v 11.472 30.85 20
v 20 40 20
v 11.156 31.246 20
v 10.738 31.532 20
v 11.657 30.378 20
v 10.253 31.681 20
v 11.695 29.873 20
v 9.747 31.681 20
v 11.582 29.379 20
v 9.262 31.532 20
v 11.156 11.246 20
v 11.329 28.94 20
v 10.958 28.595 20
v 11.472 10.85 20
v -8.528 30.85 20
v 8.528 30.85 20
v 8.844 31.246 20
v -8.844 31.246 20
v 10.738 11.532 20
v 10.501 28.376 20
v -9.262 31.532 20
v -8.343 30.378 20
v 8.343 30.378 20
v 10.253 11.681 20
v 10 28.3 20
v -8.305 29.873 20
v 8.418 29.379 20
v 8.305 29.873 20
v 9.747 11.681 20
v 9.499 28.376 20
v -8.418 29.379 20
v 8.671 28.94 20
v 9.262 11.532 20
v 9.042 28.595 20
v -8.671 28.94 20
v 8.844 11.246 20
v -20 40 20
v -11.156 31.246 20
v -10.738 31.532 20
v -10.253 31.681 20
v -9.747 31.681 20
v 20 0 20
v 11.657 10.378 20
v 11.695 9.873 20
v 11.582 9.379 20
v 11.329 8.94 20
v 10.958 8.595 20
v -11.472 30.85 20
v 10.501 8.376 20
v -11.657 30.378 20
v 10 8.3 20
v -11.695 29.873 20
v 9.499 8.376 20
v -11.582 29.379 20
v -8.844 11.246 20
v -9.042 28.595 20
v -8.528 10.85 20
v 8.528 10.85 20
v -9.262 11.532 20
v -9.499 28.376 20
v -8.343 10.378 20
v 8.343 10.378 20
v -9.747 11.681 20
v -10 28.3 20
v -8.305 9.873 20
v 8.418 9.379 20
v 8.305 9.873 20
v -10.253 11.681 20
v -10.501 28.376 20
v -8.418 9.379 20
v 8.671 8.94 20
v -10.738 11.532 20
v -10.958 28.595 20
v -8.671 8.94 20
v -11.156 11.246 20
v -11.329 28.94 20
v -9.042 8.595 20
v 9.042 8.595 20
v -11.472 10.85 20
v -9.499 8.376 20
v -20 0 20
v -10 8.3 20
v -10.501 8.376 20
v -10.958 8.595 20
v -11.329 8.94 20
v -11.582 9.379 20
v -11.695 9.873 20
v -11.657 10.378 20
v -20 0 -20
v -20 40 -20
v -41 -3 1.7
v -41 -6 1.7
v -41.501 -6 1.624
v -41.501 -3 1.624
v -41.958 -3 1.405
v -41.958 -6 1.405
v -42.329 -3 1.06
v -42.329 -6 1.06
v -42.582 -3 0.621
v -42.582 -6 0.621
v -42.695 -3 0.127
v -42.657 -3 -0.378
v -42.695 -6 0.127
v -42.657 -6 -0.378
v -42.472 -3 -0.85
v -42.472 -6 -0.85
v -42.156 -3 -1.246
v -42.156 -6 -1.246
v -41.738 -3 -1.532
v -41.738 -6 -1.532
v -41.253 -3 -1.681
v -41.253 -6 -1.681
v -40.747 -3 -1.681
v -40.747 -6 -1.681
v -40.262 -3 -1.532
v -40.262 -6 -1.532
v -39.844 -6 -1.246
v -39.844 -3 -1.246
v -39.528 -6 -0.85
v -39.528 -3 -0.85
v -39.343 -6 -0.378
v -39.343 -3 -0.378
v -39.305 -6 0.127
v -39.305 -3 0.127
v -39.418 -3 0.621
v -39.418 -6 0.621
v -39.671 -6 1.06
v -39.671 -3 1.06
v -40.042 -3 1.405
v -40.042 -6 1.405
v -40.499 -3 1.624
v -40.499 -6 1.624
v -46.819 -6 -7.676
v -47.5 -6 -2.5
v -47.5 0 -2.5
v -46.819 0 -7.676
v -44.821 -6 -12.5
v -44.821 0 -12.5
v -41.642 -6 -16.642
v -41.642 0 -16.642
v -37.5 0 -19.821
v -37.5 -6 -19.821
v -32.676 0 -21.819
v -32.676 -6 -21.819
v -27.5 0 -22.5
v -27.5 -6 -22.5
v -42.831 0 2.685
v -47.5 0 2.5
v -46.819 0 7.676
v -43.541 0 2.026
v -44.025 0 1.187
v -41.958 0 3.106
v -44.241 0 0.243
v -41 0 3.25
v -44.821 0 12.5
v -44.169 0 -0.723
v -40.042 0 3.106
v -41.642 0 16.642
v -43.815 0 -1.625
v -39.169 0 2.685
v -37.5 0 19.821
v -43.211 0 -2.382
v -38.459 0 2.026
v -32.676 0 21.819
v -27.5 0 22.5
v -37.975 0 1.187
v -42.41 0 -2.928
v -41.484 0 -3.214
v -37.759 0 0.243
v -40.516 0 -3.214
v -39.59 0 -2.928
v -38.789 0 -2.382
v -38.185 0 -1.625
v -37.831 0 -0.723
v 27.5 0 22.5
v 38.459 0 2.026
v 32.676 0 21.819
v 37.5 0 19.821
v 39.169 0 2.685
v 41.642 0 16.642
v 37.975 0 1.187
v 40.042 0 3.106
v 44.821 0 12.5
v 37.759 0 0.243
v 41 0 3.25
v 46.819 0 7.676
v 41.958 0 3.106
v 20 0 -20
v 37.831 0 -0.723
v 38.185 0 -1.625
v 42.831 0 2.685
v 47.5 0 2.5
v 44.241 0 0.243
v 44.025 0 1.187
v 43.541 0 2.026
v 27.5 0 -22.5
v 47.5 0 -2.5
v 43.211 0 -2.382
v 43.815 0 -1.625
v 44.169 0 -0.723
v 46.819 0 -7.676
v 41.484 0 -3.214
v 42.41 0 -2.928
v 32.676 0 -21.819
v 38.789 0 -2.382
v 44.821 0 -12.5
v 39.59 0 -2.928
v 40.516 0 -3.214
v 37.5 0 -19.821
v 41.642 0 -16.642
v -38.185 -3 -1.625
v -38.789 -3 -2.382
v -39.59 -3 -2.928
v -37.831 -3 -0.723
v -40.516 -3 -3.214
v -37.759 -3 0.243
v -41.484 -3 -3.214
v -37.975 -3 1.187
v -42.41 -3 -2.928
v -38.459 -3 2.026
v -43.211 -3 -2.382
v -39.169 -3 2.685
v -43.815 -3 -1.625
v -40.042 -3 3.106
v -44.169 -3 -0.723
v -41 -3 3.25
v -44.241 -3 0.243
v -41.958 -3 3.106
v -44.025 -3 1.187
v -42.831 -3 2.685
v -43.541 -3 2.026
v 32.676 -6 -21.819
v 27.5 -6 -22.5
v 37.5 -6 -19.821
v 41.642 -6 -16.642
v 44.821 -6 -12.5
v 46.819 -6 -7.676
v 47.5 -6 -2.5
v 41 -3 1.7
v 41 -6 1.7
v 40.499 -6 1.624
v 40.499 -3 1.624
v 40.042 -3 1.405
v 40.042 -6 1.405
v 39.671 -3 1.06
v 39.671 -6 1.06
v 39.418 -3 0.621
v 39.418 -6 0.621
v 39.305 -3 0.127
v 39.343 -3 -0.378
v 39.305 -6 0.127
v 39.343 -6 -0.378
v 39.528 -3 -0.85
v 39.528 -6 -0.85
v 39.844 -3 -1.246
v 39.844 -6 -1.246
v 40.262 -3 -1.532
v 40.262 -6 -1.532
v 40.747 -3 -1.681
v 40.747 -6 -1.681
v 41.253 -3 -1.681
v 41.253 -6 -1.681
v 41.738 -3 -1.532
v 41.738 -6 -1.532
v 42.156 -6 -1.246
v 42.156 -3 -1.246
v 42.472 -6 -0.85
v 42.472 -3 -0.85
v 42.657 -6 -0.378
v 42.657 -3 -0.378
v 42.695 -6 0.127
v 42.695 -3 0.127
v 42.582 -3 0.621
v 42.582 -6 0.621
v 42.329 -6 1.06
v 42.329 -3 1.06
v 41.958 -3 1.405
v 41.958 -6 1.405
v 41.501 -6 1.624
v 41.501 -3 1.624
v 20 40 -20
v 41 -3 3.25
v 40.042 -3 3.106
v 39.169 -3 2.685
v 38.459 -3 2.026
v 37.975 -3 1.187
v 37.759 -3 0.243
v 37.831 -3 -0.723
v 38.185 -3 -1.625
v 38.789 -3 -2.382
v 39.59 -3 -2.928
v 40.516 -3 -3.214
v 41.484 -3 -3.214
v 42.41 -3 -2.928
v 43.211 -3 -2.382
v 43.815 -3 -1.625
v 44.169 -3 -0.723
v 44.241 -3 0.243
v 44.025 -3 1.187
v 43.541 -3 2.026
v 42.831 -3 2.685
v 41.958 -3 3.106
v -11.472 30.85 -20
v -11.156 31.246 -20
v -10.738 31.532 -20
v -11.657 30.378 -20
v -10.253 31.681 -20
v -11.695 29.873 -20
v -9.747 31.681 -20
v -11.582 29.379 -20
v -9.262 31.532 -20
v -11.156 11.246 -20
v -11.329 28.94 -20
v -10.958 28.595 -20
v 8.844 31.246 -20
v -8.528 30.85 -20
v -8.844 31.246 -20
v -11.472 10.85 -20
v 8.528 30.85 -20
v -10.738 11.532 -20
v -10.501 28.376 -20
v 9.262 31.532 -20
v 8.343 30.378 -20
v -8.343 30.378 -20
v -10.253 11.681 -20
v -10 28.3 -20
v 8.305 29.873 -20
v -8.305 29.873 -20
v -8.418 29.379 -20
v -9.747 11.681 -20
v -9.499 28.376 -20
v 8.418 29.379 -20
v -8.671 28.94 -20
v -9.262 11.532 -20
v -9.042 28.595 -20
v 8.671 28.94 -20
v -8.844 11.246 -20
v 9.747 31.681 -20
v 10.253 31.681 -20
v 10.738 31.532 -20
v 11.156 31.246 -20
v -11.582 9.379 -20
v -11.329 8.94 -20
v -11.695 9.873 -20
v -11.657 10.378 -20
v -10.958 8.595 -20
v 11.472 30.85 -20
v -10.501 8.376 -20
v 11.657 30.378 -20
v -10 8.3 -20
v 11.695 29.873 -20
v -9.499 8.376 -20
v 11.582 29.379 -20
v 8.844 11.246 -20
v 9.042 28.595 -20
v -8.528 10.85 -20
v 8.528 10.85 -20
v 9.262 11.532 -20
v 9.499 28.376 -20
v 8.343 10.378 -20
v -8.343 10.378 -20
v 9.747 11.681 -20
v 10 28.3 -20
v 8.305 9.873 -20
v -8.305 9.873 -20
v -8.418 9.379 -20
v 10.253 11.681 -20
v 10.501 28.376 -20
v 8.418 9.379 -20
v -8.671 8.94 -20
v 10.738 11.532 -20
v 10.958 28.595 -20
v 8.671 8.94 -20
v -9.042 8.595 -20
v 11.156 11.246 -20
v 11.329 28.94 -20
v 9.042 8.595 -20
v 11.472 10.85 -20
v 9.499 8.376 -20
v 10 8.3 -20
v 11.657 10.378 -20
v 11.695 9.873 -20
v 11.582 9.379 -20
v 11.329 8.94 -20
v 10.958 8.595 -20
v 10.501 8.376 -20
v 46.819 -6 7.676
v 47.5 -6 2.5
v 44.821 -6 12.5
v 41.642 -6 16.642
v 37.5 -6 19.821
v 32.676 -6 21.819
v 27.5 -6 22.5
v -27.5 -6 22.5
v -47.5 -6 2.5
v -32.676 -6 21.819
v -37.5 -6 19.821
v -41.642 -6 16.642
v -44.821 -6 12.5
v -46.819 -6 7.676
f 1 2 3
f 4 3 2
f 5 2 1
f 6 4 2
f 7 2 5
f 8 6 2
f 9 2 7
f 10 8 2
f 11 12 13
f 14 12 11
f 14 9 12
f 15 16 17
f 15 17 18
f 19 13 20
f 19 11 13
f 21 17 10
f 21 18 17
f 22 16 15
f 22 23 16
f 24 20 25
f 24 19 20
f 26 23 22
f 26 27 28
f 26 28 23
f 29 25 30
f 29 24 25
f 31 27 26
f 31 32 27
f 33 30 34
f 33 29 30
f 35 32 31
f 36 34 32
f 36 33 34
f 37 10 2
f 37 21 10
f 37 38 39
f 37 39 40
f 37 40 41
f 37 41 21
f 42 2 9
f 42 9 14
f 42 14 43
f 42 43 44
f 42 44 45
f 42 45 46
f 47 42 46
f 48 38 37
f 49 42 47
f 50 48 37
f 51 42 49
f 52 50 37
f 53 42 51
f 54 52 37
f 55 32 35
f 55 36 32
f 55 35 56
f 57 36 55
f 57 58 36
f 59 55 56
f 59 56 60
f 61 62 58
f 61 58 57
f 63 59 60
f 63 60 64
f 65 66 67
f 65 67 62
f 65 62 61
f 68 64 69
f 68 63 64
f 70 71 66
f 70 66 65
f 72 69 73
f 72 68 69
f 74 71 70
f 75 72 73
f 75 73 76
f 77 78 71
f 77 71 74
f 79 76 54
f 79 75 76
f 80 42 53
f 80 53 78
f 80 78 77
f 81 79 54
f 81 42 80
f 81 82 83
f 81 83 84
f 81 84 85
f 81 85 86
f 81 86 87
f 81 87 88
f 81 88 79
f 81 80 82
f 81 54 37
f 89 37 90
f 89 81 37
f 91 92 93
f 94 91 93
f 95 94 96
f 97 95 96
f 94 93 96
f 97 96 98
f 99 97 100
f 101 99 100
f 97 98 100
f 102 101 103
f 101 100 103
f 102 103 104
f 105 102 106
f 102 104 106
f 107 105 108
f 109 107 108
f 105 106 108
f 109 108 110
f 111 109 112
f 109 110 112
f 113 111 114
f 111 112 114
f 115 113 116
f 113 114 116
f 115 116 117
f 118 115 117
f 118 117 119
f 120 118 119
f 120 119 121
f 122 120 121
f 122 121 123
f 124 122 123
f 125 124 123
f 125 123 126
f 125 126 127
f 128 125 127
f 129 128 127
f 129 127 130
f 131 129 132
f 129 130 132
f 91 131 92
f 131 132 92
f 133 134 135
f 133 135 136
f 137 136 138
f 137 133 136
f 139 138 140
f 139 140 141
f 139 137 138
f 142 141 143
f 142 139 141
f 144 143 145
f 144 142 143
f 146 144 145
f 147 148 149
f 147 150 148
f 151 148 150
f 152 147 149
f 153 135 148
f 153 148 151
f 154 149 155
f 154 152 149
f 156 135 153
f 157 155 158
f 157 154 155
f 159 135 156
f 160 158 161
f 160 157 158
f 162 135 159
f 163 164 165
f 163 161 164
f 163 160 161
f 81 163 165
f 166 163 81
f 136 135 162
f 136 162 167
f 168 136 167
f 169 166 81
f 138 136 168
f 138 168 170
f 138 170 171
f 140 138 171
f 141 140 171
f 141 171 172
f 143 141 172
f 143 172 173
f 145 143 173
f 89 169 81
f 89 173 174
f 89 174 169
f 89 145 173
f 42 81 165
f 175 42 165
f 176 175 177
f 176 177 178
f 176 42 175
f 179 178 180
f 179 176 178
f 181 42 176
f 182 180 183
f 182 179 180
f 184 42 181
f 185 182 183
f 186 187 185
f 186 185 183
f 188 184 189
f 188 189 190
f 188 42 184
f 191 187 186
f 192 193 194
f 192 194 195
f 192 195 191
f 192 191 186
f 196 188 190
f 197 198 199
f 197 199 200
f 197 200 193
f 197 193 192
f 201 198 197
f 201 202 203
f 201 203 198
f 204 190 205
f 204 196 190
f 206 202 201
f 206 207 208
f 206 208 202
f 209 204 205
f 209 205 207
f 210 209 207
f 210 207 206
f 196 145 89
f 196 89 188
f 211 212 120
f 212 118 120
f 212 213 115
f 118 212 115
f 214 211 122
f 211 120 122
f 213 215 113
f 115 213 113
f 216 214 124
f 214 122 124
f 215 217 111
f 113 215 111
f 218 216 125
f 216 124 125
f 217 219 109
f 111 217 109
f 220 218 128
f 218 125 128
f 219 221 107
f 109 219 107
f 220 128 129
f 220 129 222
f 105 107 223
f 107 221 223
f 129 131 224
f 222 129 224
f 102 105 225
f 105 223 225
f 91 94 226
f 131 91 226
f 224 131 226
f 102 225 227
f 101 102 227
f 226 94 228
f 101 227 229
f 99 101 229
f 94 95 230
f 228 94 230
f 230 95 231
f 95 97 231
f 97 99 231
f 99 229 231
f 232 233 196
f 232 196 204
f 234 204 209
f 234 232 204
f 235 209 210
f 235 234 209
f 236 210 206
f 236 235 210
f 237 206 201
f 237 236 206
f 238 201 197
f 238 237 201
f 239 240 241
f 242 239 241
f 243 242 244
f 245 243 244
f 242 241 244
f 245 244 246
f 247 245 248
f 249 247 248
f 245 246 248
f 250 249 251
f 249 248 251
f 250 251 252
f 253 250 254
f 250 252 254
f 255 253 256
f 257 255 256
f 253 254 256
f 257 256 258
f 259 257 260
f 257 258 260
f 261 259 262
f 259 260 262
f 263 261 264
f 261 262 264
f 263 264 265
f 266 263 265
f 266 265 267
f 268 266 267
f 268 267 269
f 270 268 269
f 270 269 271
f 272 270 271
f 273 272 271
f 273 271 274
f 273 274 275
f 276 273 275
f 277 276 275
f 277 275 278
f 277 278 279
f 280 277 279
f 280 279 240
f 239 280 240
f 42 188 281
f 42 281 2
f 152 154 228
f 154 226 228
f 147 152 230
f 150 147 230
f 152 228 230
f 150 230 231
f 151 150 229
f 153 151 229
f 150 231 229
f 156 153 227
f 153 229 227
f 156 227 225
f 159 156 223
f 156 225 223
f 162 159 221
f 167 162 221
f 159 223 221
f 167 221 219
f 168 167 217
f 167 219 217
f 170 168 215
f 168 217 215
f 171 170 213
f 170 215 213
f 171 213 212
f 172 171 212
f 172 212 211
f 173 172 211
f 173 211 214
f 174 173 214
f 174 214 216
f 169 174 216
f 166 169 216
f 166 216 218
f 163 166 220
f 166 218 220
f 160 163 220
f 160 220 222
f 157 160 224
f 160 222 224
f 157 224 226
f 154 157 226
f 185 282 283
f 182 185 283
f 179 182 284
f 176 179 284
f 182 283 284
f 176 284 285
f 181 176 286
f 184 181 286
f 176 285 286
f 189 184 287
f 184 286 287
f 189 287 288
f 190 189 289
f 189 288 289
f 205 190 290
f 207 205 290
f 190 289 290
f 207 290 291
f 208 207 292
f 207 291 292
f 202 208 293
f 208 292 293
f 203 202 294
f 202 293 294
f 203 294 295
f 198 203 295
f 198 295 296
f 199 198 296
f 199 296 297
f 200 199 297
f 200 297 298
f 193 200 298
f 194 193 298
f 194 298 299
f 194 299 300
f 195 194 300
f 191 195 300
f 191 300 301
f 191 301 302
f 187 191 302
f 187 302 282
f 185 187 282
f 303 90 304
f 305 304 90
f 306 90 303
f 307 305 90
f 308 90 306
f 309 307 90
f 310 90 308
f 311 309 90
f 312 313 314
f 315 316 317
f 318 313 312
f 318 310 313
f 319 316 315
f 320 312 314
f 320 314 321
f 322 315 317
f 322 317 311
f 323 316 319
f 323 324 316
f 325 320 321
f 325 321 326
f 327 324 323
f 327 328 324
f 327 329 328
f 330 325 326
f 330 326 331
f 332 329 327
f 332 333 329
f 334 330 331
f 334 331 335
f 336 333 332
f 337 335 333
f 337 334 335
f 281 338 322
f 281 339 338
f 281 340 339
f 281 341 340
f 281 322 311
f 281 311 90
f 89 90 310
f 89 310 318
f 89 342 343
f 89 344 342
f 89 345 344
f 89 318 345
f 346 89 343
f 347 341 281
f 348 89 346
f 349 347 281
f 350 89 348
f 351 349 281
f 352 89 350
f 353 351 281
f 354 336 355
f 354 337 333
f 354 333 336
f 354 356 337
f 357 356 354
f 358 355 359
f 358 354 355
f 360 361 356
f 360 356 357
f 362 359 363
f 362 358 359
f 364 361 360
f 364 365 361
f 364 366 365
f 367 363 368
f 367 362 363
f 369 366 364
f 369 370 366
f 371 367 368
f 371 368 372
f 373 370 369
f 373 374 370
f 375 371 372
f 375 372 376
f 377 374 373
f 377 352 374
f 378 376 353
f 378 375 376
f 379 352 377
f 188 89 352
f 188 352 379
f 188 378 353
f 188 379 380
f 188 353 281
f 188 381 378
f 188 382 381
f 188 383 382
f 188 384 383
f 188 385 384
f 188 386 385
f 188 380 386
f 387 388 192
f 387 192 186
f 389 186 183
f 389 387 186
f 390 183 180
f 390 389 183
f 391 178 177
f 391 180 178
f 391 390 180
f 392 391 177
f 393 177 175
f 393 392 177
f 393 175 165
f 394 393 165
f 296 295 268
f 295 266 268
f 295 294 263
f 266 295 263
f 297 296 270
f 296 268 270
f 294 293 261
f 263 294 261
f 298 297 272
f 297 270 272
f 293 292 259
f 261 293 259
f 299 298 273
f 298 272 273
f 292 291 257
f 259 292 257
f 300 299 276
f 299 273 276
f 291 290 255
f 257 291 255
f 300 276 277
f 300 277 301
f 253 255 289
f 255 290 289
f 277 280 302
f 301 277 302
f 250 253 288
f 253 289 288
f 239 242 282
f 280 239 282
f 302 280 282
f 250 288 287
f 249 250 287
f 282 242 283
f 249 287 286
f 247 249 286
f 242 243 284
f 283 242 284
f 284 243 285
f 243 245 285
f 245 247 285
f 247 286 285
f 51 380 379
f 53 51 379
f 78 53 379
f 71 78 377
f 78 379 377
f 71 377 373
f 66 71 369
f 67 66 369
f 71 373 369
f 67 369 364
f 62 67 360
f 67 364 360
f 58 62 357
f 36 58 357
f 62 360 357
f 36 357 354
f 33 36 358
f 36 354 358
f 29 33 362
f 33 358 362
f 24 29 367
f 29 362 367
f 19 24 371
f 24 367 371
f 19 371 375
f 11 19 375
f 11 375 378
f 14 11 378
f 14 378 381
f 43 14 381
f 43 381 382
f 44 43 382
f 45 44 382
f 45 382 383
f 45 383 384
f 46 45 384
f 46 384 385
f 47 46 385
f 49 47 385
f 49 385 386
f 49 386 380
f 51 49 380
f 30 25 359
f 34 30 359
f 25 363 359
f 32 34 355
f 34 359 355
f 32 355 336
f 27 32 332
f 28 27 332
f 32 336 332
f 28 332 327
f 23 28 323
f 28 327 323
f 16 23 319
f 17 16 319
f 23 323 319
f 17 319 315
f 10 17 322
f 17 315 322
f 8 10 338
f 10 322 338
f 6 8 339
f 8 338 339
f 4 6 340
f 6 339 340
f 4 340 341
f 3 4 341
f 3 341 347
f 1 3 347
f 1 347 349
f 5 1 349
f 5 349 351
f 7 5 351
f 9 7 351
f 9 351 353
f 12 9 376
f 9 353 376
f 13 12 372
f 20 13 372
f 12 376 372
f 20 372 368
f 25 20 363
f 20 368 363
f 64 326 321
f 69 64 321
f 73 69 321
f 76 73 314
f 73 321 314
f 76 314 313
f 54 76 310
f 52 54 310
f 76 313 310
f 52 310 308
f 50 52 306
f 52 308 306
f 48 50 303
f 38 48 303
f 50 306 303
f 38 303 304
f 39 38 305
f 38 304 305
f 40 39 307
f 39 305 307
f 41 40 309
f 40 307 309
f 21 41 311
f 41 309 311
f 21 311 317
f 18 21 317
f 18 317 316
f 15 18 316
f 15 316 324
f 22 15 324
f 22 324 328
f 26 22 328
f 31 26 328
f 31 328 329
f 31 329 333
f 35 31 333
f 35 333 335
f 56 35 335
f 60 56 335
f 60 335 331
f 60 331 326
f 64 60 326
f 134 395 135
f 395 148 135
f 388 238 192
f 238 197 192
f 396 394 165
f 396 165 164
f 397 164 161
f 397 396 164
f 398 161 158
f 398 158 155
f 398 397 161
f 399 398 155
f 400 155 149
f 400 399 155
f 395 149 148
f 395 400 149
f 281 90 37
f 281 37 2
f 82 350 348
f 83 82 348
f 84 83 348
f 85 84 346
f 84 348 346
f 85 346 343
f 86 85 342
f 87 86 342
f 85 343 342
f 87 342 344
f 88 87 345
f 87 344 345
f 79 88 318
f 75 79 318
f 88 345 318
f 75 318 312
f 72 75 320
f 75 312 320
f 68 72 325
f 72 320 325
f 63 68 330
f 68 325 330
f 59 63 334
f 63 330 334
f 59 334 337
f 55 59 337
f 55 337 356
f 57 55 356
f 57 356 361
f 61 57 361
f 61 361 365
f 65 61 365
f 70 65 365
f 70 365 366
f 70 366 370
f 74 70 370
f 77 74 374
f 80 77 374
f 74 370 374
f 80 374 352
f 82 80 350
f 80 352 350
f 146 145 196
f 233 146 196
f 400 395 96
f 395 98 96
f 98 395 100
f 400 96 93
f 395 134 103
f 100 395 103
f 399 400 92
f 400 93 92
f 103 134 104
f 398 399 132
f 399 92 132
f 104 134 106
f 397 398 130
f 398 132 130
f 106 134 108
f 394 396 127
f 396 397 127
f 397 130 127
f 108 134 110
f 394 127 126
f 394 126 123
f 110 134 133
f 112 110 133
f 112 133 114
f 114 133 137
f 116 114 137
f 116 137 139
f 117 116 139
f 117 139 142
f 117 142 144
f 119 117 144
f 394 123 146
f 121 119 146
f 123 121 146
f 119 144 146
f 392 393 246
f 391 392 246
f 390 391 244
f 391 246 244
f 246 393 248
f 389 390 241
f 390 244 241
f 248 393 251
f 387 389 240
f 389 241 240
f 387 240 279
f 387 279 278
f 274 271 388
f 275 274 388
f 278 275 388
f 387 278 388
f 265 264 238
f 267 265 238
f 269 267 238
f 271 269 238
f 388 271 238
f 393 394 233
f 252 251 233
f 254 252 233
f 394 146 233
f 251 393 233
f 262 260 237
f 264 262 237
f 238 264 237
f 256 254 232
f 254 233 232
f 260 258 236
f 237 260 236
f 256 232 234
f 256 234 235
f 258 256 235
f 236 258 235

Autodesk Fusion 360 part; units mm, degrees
sketch "Sketch1" plane through (0, 0, 0) normal (0, 1, 0) x (1, 0, 0)
  line L0 (47.5, -22.5) -> (-47.5, -22.5)
  line L1 (-47.5, -22.5) -> (-47.5, 22.5)
  line L2 (-47.5, 22.5) -> (47.5, 22.5)
  line L3 (47.5, 22.5) -> (47.5, -22.5)
  line L4 (47.5, -22.5) -> (-47.5, 22.5) construction
  line L5 (-47.5, -22.5) -> (47.5, 22.5) construction
  line L6 (20, -20) -> (-20, -20)
  line L7 (-20, -20) -> (-20, 20)
  line L8 (-20, 20) -> (20, 20)
  line L9 (20, 20) -> (20, -20)
  line L10 (20, -20) -> (-20, 20) construction
  line L11 (-20, -20) -> (20, 20) construction
  point P0 (-41, 0)
  point P1 (41, 0)
  dimension "d1" = 95
  dimension "d2" = 45
  dimension "d3" = 82
  dimension "d4" = 41
  dimension "d11" = 40
  dimension "d12" = 40
extrude "Extrude1" add sketch "Sketch1" against normal blind 6 contours L0 L1 L2 L3 | L6 L7 L8 L9
hole "Hole1" at (-41, 0, 0) at (41, 0, 0) direction (0, -1, 0) diameter 3.4 depth 35 tip angle 118 counterbore diameter 6.5 counterbore depth 3
extrude "Extrude2" add sketch "Sketch1" along normal blind 40 contours L6 L7 L8 L9
fillet "Fillet1" radius 20 2 edges at (-47.5, -3, 22.5) (-47.5, -3, -22.5)
fillet "Fillet1" radius 20 2 edges at (47.5, -3, 22.5) (47.5, -3, -22.5)
sketch "Sketch2" plane through (0, 0, 20) normal (0, 0, 1) x (1, 0, 0)
  line L0 (-20, 0) -> (20, 0)
  line L1 (20, 0) -> (20, 40)
  line L2 (20, 40) -> (-20, 40)
  line L3 (-20, 40) -> (-20, 0)
  point P0 (-10, 30)
  point P1 (10, 30)
  point P2 (10, 10)
  point P3 (-10, 10)
hole "Hole2" at (10, 30, 20) at (-10, 30, 20) at (-10, 10, 20) at (10, 10, 20) direction (0, 0, -1) diameter 3.4 depth 44 tip angle 118
equation "d4 = d3 / 2"
